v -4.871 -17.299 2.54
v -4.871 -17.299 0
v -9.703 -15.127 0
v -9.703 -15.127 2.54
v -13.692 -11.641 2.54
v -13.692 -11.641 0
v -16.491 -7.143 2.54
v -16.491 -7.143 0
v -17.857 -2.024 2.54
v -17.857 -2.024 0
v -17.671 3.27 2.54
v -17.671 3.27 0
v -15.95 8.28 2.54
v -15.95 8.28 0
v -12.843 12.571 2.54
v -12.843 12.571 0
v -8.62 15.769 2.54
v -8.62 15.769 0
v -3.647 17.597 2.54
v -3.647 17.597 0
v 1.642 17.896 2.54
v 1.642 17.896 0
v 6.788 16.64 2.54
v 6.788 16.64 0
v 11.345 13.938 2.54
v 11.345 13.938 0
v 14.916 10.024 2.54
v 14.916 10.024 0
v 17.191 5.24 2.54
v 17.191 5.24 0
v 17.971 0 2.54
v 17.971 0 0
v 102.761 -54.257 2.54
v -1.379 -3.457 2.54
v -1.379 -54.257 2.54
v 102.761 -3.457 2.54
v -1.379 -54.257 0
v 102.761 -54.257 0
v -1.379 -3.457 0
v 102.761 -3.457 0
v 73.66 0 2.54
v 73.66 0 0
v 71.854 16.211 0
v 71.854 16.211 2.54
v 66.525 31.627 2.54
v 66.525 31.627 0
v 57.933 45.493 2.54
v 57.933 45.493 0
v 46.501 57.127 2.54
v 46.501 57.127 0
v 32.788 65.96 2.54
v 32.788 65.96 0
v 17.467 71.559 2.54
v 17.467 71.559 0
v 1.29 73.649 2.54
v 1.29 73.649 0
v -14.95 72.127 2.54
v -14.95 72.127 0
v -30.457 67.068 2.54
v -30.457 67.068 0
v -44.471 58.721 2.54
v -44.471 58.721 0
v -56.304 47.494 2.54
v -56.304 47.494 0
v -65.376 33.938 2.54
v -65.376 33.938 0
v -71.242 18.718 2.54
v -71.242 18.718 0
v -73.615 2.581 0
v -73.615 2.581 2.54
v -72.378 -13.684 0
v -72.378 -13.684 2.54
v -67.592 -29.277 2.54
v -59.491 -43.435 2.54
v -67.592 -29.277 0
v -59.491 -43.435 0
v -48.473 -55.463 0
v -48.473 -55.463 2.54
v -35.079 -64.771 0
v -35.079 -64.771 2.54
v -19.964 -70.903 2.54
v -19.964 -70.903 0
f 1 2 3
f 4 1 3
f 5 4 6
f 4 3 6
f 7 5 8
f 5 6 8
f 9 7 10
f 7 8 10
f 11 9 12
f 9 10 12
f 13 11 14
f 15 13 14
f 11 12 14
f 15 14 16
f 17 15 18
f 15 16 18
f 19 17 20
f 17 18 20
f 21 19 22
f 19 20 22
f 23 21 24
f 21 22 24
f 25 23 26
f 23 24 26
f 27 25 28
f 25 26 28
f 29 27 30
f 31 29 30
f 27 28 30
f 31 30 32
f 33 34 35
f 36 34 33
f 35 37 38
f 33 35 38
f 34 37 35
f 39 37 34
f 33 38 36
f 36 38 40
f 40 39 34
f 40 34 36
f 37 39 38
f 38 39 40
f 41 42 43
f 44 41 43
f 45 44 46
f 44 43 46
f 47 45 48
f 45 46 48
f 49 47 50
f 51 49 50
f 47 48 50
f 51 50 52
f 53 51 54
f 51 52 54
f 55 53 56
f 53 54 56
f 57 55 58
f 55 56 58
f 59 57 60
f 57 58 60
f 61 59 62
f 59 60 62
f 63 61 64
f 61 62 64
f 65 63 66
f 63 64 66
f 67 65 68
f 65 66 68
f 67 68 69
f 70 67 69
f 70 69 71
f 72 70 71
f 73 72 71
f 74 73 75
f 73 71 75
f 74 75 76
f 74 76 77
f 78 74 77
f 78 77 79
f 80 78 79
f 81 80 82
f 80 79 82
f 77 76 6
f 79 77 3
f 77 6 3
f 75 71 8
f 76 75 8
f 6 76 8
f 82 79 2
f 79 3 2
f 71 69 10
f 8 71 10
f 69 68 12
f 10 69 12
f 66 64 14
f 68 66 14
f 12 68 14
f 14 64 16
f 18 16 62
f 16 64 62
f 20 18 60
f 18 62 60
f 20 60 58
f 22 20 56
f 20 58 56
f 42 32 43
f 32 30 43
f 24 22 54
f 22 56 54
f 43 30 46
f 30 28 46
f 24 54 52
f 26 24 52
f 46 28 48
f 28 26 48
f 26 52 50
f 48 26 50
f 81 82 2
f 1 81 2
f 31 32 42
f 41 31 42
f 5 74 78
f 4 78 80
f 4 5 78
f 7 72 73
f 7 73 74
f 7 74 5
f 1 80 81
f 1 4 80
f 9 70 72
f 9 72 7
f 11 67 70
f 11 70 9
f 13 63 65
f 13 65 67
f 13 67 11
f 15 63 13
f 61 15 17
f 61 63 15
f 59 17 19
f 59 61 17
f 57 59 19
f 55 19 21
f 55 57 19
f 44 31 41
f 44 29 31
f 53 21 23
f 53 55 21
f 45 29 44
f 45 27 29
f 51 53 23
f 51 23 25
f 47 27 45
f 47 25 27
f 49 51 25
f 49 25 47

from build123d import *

# Parameters (mm, degrees)
BOSS_EXTRUDE1_DEPTH   = 2.54
SKETCH2_W             = 104.14
SKETCH2_H             = 50.8
BOSS_EXTRUDE1_2_DEPTH = 2.54


with BuildPart() as part:
    # Sketch2 → Boss-Extrude1 (new body)
    with BuildSketch(Plane.XY):
        with BuildLine():
            Line((17.971437451, 0), (73.66, 0))
            ThreePointArc((73.66, 0), (-44.47059818, 58.721048164), (-19.96371701, -70.903071888))
            Line((-19.96371701, -70.903071888), (-4.870712619, -17.298806972))
            ThreePointArc((-4.870712619, -17.298806972), (-10.849858453, 14.326658216), (17.971437451, 0))
        make_face()
    extrude(amount=BOSS_EXTRUDE1_DEPTH)


with BuildPart() as body_2:
    # Sketch2 → Boss-Extrude1 2 (new body)
    with BuildSketch(Plane.XY):
        with Locations((50.690821842, -28.856742093)):
            Rectangle(SKETCH2_W, SKETCH2_H)
    extrude(amount=BOSS_EXTRUDE1_2_DEPTH)


solid = Compound([part.part, body_2.part])
